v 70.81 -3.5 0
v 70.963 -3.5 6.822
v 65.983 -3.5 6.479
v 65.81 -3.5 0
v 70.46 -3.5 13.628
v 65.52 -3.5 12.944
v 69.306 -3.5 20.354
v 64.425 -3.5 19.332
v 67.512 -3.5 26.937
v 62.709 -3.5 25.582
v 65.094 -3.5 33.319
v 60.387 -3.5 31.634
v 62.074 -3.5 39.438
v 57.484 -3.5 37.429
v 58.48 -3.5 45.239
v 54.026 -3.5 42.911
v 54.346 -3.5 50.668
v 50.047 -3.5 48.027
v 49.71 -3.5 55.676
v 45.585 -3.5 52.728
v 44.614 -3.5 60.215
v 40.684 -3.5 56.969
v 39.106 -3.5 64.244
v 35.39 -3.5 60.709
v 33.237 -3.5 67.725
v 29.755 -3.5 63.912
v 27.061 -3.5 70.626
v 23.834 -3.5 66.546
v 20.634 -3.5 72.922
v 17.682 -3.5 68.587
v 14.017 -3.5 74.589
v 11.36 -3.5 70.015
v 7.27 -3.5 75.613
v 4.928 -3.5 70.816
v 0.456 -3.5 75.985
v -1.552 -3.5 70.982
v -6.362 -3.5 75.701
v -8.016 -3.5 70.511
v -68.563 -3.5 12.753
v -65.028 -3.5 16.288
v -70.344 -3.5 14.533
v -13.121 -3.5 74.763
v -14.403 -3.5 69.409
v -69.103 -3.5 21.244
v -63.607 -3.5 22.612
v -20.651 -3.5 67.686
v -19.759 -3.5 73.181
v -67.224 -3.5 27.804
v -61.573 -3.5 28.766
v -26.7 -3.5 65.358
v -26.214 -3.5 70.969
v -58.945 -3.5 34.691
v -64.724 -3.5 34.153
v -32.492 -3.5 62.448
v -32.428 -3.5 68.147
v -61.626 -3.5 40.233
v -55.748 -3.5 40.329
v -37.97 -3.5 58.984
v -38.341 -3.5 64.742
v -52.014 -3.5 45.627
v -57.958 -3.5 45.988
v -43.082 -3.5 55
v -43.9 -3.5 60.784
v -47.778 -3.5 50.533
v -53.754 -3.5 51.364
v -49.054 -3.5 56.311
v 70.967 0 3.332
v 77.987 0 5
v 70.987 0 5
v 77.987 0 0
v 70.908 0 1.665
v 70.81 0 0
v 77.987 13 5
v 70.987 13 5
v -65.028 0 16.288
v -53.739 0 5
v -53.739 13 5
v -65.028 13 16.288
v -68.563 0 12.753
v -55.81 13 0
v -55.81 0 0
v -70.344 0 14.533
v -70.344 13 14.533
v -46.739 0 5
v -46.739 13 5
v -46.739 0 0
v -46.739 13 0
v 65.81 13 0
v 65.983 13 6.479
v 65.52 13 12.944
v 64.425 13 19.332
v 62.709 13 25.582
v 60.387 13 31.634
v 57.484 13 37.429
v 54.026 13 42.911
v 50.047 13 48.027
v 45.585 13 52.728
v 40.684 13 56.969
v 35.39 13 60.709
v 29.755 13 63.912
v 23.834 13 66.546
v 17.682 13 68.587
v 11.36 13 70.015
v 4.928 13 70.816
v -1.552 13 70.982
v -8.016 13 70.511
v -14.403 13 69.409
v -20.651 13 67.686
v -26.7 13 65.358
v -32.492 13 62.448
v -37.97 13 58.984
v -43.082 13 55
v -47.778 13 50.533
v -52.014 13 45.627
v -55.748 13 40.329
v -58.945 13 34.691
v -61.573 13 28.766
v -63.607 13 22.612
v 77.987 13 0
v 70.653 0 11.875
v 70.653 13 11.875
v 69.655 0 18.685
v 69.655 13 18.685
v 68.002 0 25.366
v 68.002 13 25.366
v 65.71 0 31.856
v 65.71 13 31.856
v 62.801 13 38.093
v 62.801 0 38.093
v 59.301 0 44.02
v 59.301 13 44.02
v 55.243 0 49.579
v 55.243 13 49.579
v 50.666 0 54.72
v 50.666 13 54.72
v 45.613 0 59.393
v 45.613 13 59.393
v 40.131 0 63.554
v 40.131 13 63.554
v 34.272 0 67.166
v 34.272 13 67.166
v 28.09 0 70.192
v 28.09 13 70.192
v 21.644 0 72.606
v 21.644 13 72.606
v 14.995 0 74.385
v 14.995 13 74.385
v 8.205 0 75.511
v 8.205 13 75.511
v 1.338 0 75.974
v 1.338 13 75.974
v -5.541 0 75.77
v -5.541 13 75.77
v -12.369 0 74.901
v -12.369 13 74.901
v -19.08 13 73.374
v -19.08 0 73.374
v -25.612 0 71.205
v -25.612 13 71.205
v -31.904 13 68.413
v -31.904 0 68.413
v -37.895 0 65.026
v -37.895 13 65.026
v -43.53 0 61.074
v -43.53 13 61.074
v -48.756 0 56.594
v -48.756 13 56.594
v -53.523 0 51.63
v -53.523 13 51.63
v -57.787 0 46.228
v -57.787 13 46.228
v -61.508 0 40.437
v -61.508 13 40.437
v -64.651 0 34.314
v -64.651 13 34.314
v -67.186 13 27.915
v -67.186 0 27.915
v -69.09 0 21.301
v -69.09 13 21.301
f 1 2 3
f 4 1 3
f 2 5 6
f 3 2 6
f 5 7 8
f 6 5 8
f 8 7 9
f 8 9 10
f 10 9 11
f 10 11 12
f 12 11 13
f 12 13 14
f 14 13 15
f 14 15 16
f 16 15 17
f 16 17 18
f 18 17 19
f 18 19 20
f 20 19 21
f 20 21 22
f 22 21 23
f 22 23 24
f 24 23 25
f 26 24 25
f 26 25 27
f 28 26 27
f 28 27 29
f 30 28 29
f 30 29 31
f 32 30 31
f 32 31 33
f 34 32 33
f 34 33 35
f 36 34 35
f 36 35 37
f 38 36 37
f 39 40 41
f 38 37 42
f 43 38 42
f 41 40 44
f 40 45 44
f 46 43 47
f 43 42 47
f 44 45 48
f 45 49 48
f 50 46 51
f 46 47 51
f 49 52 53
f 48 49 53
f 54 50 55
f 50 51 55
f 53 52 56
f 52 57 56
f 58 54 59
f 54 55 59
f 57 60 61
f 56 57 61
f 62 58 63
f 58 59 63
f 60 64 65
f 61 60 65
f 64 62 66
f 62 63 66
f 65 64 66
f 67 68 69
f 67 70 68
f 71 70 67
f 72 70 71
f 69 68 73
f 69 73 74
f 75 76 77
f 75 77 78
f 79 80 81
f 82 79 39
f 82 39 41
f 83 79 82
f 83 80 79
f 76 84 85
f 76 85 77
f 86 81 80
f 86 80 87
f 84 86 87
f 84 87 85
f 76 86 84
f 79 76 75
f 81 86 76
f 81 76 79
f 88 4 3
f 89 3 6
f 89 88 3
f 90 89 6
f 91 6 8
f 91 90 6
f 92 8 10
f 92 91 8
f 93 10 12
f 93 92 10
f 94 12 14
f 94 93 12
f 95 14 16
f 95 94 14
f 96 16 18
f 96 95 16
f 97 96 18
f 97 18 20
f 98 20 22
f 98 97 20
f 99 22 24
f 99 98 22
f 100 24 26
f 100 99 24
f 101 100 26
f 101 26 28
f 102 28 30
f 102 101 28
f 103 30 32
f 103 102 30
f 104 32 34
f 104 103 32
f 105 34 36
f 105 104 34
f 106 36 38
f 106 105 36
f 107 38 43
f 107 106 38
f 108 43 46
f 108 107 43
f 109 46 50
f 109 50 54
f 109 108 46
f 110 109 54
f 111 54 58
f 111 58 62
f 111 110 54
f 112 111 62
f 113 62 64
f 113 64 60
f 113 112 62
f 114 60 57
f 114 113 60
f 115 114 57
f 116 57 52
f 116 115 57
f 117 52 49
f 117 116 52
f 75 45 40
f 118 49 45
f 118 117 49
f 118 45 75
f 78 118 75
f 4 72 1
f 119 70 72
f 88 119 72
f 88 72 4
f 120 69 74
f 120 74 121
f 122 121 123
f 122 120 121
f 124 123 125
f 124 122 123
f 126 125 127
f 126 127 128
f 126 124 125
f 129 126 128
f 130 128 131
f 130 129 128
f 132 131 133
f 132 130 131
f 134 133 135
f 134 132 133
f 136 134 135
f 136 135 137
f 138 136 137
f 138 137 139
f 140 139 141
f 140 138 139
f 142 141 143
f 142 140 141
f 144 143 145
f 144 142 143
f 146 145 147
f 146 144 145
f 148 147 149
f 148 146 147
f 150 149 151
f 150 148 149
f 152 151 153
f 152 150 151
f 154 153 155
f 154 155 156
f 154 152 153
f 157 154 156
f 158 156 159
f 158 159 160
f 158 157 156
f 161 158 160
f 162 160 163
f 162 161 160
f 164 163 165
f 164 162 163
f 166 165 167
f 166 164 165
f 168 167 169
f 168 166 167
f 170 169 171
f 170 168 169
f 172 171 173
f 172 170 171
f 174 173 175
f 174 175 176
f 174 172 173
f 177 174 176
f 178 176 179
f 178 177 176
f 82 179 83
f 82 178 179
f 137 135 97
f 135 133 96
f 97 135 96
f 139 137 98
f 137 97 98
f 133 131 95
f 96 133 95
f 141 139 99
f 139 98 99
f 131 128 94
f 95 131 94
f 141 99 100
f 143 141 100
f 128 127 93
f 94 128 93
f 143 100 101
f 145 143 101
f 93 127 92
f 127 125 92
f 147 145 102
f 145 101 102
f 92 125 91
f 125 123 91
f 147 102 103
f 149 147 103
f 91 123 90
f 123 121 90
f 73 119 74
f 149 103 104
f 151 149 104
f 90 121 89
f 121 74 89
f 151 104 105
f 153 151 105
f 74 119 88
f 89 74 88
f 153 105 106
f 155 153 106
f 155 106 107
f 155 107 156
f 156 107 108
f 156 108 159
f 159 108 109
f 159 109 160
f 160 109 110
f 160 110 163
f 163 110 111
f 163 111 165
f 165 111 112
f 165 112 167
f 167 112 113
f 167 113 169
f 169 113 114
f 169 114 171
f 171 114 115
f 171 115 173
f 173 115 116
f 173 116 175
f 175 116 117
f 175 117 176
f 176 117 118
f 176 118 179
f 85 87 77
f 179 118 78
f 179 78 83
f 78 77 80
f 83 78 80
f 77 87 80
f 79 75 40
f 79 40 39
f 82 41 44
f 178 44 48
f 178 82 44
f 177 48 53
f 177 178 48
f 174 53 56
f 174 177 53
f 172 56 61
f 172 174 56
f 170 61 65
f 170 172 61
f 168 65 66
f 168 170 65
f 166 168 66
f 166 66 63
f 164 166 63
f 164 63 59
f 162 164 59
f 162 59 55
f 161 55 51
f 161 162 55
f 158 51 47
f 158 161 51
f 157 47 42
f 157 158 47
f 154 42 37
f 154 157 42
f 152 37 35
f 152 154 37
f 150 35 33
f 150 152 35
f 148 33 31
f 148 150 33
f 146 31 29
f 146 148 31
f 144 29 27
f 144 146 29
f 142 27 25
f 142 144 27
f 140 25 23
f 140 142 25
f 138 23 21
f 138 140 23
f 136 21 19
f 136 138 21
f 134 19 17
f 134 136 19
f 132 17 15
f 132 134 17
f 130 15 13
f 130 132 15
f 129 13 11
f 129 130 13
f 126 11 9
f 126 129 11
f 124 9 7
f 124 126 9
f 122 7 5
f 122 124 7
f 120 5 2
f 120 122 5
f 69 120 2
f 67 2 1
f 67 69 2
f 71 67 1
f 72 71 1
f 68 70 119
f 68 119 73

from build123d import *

# Parameters (mm, degrees)
BOSS_EXTRUDE1_DEPTH = 13
BOSS_EXTRUDE2_DEPTH = 3.5


with BuildPart() as part:
    # Sketch1 → Boss-Extrude1 (new body)
    with BuildSketch(Plane(origin=(0, 0, 0), x_dir=(1, 0, 0), z_dir=(0, 1, 0))):
        with BuildLine():
            Line((-70.343588137, -14.533254602), (-55.810333535, 0))
            Line((-55.810333535, 0), (-46.739265723, 0))
            Line((-46.739265723, 0), (-46.739265723, -5))
            Line((-46.739265723, -5), (-53.739265723, -5))
            Line((-53.739265723, -5), (-65.02750007, -16.288234347))
            ThreePointArc((-65.02750007, -16.288234347), (8.153517743, -70.494428377), (65.810333535, 0))
            Line((65.810333535, 0), (77.98664195, 0))
            Line((77.98664195, 0), (77.98664195, -5))
            Line((77.98664195, -5), (70.98664195, -5))
            ThreePointArc((70.98664195, -5), (4.777459092, -75.825696043), (-70.343588137, -14.533254602))
        make_face()
    extrude(amount=BOSS_EXTRUDE1_DEPTH)

    # Sketch2 → Boss-Extrude2 (add)
    with BuildSketch(Plane.XZ):
        with BuildLine():
            Line((-65.02750007, 16.288234347), (-68.563033976, 12.752700441))
            Line((-68.563033976, 12.752700441), (-70.343588137, 14.533254602))
            ThreePointArc((-70.343588137, 14.533254602), (7.270373797, 75.613348598), (70.810333535, 0))
            Line((70.810333535, 0), (65.810333535, 0))
            ThreePointArc((65.810333535, 0), (8.153517743, 70.494428377), (-65.02750007, 16.288234347))
        make_face()
    extrude(amount=BOSS_EXTRUDE2_DEPTH)


solid = part.part
